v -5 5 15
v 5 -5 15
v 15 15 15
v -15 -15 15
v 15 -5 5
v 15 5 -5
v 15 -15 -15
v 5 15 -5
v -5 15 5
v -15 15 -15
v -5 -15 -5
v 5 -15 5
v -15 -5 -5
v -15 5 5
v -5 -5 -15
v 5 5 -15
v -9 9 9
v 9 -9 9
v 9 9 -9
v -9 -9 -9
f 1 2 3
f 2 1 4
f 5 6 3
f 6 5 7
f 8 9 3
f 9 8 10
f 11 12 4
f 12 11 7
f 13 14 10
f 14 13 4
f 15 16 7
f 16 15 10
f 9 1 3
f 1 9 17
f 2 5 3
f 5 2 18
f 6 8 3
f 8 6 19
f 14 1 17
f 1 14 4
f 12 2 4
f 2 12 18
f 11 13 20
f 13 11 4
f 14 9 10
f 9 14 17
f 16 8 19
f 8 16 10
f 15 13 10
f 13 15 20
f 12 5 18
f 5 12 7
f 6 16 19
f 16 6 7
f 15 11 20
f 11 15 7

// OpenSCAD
// Sharpohedron
// (C) @oblomobka - 2024.02
// GPL license

/* **CUSTOMIZER VARIABLES** */
// Edge
h = 30; //[10:100]
// Center of the solid or stand over a face
position = "Center"; //["Center", "Face"]

/* **MODULES** */
module Sharpohedron ( h = 30, position = "Face"){
    
    // Invariants
    diAngleCube = 90; // dihedral angle of cube
    
    // Relations
    rCirCube = sqrt(3)/2; // radius of a circumscribed sphere for edge = 1 / = 1,061...
    rInsCube = 1/2; // radius of a inscribed sphere for edge = 1 / = 0,5
    rMidCube = 1/sqrt(2); // Midradius, which touches the middle of each edge / =0,707...
    
    // Variables
    a = h/2;
    rl = 1*h/3; // factor para el rombo largo
    b = a-rl;
    k = 1*h/5; // // factor para la kite
    c = a-k;
    
    // Definition of points and faces V = 20 / F = 18
    Shpoints = [
        // UP
        [ +a, +a, +a],
        [ -a, +b, +b], [ -b, +a, +b], [ -b, +b, +a], [ -c, +c, +c], // [  1,  2,  3,  4]
        [ +a, -b, +b], [ +b, -a, +b], [ +b, -b, +a], [ +c, -c, +c], // [  5,  6,  7,  8]
        [ -a, -a, +a],
        // DOWN    
        [ +a, +b, -b], [ +b, +a, -b], [ +b, +b, -a], [ +c, +c, -c], // [ 10, 11, 12, 13]
        [ -a, +a, -a],
        [ +a, -a, -a],
        [ -a, -b, -b], [ -b, -a, -b], [ -b, -b, -a], [ -c, -c, -c], // [ 16, 17, 18, 19]
        ];
    
    Shfaces = [
        // Rombos
        [  0,  7,  9,  3], [  0, 10, 15,  5], [  0,  2, 14, 11],
        [  9,  6, 15, 17], [  9, 16, 14,  1], [ 14, 18, 15, 12],
        
        [  0,  3,  4,  2], [  0, 5, 8, 7], [  0, 11, 13, 10],
        [  9,  1,  4,  3], [  9,  7,  8,  6], [  9, 17, 19, 16],
        [ 14,  2,  4,  1], [ 14, 12, 13, 11], [ 14, 16, 19, 18],
        [ 15,  6,  8,  5], [ 15, 10, 13, 12], [ 15, 18, 19, 17]
        ];
    
    // Polyhedron stands on xy plane centered on the center of the face or centered on the center of polyhedron
    if ( position == "Face"){
        translate([ 0, 0, a])
            polyhedron( Shpoints, Shfaces);}
    else if ( position == "Center") {
        polyhedron( Shpoints, Shfaces);} 
}


/* **RENDERING OF SOLIDS** */ 
union(){
Sharpohedron ( h = h, position = position);
//rotate (90){Sharpohedron ( h = h, position = position);}
}
